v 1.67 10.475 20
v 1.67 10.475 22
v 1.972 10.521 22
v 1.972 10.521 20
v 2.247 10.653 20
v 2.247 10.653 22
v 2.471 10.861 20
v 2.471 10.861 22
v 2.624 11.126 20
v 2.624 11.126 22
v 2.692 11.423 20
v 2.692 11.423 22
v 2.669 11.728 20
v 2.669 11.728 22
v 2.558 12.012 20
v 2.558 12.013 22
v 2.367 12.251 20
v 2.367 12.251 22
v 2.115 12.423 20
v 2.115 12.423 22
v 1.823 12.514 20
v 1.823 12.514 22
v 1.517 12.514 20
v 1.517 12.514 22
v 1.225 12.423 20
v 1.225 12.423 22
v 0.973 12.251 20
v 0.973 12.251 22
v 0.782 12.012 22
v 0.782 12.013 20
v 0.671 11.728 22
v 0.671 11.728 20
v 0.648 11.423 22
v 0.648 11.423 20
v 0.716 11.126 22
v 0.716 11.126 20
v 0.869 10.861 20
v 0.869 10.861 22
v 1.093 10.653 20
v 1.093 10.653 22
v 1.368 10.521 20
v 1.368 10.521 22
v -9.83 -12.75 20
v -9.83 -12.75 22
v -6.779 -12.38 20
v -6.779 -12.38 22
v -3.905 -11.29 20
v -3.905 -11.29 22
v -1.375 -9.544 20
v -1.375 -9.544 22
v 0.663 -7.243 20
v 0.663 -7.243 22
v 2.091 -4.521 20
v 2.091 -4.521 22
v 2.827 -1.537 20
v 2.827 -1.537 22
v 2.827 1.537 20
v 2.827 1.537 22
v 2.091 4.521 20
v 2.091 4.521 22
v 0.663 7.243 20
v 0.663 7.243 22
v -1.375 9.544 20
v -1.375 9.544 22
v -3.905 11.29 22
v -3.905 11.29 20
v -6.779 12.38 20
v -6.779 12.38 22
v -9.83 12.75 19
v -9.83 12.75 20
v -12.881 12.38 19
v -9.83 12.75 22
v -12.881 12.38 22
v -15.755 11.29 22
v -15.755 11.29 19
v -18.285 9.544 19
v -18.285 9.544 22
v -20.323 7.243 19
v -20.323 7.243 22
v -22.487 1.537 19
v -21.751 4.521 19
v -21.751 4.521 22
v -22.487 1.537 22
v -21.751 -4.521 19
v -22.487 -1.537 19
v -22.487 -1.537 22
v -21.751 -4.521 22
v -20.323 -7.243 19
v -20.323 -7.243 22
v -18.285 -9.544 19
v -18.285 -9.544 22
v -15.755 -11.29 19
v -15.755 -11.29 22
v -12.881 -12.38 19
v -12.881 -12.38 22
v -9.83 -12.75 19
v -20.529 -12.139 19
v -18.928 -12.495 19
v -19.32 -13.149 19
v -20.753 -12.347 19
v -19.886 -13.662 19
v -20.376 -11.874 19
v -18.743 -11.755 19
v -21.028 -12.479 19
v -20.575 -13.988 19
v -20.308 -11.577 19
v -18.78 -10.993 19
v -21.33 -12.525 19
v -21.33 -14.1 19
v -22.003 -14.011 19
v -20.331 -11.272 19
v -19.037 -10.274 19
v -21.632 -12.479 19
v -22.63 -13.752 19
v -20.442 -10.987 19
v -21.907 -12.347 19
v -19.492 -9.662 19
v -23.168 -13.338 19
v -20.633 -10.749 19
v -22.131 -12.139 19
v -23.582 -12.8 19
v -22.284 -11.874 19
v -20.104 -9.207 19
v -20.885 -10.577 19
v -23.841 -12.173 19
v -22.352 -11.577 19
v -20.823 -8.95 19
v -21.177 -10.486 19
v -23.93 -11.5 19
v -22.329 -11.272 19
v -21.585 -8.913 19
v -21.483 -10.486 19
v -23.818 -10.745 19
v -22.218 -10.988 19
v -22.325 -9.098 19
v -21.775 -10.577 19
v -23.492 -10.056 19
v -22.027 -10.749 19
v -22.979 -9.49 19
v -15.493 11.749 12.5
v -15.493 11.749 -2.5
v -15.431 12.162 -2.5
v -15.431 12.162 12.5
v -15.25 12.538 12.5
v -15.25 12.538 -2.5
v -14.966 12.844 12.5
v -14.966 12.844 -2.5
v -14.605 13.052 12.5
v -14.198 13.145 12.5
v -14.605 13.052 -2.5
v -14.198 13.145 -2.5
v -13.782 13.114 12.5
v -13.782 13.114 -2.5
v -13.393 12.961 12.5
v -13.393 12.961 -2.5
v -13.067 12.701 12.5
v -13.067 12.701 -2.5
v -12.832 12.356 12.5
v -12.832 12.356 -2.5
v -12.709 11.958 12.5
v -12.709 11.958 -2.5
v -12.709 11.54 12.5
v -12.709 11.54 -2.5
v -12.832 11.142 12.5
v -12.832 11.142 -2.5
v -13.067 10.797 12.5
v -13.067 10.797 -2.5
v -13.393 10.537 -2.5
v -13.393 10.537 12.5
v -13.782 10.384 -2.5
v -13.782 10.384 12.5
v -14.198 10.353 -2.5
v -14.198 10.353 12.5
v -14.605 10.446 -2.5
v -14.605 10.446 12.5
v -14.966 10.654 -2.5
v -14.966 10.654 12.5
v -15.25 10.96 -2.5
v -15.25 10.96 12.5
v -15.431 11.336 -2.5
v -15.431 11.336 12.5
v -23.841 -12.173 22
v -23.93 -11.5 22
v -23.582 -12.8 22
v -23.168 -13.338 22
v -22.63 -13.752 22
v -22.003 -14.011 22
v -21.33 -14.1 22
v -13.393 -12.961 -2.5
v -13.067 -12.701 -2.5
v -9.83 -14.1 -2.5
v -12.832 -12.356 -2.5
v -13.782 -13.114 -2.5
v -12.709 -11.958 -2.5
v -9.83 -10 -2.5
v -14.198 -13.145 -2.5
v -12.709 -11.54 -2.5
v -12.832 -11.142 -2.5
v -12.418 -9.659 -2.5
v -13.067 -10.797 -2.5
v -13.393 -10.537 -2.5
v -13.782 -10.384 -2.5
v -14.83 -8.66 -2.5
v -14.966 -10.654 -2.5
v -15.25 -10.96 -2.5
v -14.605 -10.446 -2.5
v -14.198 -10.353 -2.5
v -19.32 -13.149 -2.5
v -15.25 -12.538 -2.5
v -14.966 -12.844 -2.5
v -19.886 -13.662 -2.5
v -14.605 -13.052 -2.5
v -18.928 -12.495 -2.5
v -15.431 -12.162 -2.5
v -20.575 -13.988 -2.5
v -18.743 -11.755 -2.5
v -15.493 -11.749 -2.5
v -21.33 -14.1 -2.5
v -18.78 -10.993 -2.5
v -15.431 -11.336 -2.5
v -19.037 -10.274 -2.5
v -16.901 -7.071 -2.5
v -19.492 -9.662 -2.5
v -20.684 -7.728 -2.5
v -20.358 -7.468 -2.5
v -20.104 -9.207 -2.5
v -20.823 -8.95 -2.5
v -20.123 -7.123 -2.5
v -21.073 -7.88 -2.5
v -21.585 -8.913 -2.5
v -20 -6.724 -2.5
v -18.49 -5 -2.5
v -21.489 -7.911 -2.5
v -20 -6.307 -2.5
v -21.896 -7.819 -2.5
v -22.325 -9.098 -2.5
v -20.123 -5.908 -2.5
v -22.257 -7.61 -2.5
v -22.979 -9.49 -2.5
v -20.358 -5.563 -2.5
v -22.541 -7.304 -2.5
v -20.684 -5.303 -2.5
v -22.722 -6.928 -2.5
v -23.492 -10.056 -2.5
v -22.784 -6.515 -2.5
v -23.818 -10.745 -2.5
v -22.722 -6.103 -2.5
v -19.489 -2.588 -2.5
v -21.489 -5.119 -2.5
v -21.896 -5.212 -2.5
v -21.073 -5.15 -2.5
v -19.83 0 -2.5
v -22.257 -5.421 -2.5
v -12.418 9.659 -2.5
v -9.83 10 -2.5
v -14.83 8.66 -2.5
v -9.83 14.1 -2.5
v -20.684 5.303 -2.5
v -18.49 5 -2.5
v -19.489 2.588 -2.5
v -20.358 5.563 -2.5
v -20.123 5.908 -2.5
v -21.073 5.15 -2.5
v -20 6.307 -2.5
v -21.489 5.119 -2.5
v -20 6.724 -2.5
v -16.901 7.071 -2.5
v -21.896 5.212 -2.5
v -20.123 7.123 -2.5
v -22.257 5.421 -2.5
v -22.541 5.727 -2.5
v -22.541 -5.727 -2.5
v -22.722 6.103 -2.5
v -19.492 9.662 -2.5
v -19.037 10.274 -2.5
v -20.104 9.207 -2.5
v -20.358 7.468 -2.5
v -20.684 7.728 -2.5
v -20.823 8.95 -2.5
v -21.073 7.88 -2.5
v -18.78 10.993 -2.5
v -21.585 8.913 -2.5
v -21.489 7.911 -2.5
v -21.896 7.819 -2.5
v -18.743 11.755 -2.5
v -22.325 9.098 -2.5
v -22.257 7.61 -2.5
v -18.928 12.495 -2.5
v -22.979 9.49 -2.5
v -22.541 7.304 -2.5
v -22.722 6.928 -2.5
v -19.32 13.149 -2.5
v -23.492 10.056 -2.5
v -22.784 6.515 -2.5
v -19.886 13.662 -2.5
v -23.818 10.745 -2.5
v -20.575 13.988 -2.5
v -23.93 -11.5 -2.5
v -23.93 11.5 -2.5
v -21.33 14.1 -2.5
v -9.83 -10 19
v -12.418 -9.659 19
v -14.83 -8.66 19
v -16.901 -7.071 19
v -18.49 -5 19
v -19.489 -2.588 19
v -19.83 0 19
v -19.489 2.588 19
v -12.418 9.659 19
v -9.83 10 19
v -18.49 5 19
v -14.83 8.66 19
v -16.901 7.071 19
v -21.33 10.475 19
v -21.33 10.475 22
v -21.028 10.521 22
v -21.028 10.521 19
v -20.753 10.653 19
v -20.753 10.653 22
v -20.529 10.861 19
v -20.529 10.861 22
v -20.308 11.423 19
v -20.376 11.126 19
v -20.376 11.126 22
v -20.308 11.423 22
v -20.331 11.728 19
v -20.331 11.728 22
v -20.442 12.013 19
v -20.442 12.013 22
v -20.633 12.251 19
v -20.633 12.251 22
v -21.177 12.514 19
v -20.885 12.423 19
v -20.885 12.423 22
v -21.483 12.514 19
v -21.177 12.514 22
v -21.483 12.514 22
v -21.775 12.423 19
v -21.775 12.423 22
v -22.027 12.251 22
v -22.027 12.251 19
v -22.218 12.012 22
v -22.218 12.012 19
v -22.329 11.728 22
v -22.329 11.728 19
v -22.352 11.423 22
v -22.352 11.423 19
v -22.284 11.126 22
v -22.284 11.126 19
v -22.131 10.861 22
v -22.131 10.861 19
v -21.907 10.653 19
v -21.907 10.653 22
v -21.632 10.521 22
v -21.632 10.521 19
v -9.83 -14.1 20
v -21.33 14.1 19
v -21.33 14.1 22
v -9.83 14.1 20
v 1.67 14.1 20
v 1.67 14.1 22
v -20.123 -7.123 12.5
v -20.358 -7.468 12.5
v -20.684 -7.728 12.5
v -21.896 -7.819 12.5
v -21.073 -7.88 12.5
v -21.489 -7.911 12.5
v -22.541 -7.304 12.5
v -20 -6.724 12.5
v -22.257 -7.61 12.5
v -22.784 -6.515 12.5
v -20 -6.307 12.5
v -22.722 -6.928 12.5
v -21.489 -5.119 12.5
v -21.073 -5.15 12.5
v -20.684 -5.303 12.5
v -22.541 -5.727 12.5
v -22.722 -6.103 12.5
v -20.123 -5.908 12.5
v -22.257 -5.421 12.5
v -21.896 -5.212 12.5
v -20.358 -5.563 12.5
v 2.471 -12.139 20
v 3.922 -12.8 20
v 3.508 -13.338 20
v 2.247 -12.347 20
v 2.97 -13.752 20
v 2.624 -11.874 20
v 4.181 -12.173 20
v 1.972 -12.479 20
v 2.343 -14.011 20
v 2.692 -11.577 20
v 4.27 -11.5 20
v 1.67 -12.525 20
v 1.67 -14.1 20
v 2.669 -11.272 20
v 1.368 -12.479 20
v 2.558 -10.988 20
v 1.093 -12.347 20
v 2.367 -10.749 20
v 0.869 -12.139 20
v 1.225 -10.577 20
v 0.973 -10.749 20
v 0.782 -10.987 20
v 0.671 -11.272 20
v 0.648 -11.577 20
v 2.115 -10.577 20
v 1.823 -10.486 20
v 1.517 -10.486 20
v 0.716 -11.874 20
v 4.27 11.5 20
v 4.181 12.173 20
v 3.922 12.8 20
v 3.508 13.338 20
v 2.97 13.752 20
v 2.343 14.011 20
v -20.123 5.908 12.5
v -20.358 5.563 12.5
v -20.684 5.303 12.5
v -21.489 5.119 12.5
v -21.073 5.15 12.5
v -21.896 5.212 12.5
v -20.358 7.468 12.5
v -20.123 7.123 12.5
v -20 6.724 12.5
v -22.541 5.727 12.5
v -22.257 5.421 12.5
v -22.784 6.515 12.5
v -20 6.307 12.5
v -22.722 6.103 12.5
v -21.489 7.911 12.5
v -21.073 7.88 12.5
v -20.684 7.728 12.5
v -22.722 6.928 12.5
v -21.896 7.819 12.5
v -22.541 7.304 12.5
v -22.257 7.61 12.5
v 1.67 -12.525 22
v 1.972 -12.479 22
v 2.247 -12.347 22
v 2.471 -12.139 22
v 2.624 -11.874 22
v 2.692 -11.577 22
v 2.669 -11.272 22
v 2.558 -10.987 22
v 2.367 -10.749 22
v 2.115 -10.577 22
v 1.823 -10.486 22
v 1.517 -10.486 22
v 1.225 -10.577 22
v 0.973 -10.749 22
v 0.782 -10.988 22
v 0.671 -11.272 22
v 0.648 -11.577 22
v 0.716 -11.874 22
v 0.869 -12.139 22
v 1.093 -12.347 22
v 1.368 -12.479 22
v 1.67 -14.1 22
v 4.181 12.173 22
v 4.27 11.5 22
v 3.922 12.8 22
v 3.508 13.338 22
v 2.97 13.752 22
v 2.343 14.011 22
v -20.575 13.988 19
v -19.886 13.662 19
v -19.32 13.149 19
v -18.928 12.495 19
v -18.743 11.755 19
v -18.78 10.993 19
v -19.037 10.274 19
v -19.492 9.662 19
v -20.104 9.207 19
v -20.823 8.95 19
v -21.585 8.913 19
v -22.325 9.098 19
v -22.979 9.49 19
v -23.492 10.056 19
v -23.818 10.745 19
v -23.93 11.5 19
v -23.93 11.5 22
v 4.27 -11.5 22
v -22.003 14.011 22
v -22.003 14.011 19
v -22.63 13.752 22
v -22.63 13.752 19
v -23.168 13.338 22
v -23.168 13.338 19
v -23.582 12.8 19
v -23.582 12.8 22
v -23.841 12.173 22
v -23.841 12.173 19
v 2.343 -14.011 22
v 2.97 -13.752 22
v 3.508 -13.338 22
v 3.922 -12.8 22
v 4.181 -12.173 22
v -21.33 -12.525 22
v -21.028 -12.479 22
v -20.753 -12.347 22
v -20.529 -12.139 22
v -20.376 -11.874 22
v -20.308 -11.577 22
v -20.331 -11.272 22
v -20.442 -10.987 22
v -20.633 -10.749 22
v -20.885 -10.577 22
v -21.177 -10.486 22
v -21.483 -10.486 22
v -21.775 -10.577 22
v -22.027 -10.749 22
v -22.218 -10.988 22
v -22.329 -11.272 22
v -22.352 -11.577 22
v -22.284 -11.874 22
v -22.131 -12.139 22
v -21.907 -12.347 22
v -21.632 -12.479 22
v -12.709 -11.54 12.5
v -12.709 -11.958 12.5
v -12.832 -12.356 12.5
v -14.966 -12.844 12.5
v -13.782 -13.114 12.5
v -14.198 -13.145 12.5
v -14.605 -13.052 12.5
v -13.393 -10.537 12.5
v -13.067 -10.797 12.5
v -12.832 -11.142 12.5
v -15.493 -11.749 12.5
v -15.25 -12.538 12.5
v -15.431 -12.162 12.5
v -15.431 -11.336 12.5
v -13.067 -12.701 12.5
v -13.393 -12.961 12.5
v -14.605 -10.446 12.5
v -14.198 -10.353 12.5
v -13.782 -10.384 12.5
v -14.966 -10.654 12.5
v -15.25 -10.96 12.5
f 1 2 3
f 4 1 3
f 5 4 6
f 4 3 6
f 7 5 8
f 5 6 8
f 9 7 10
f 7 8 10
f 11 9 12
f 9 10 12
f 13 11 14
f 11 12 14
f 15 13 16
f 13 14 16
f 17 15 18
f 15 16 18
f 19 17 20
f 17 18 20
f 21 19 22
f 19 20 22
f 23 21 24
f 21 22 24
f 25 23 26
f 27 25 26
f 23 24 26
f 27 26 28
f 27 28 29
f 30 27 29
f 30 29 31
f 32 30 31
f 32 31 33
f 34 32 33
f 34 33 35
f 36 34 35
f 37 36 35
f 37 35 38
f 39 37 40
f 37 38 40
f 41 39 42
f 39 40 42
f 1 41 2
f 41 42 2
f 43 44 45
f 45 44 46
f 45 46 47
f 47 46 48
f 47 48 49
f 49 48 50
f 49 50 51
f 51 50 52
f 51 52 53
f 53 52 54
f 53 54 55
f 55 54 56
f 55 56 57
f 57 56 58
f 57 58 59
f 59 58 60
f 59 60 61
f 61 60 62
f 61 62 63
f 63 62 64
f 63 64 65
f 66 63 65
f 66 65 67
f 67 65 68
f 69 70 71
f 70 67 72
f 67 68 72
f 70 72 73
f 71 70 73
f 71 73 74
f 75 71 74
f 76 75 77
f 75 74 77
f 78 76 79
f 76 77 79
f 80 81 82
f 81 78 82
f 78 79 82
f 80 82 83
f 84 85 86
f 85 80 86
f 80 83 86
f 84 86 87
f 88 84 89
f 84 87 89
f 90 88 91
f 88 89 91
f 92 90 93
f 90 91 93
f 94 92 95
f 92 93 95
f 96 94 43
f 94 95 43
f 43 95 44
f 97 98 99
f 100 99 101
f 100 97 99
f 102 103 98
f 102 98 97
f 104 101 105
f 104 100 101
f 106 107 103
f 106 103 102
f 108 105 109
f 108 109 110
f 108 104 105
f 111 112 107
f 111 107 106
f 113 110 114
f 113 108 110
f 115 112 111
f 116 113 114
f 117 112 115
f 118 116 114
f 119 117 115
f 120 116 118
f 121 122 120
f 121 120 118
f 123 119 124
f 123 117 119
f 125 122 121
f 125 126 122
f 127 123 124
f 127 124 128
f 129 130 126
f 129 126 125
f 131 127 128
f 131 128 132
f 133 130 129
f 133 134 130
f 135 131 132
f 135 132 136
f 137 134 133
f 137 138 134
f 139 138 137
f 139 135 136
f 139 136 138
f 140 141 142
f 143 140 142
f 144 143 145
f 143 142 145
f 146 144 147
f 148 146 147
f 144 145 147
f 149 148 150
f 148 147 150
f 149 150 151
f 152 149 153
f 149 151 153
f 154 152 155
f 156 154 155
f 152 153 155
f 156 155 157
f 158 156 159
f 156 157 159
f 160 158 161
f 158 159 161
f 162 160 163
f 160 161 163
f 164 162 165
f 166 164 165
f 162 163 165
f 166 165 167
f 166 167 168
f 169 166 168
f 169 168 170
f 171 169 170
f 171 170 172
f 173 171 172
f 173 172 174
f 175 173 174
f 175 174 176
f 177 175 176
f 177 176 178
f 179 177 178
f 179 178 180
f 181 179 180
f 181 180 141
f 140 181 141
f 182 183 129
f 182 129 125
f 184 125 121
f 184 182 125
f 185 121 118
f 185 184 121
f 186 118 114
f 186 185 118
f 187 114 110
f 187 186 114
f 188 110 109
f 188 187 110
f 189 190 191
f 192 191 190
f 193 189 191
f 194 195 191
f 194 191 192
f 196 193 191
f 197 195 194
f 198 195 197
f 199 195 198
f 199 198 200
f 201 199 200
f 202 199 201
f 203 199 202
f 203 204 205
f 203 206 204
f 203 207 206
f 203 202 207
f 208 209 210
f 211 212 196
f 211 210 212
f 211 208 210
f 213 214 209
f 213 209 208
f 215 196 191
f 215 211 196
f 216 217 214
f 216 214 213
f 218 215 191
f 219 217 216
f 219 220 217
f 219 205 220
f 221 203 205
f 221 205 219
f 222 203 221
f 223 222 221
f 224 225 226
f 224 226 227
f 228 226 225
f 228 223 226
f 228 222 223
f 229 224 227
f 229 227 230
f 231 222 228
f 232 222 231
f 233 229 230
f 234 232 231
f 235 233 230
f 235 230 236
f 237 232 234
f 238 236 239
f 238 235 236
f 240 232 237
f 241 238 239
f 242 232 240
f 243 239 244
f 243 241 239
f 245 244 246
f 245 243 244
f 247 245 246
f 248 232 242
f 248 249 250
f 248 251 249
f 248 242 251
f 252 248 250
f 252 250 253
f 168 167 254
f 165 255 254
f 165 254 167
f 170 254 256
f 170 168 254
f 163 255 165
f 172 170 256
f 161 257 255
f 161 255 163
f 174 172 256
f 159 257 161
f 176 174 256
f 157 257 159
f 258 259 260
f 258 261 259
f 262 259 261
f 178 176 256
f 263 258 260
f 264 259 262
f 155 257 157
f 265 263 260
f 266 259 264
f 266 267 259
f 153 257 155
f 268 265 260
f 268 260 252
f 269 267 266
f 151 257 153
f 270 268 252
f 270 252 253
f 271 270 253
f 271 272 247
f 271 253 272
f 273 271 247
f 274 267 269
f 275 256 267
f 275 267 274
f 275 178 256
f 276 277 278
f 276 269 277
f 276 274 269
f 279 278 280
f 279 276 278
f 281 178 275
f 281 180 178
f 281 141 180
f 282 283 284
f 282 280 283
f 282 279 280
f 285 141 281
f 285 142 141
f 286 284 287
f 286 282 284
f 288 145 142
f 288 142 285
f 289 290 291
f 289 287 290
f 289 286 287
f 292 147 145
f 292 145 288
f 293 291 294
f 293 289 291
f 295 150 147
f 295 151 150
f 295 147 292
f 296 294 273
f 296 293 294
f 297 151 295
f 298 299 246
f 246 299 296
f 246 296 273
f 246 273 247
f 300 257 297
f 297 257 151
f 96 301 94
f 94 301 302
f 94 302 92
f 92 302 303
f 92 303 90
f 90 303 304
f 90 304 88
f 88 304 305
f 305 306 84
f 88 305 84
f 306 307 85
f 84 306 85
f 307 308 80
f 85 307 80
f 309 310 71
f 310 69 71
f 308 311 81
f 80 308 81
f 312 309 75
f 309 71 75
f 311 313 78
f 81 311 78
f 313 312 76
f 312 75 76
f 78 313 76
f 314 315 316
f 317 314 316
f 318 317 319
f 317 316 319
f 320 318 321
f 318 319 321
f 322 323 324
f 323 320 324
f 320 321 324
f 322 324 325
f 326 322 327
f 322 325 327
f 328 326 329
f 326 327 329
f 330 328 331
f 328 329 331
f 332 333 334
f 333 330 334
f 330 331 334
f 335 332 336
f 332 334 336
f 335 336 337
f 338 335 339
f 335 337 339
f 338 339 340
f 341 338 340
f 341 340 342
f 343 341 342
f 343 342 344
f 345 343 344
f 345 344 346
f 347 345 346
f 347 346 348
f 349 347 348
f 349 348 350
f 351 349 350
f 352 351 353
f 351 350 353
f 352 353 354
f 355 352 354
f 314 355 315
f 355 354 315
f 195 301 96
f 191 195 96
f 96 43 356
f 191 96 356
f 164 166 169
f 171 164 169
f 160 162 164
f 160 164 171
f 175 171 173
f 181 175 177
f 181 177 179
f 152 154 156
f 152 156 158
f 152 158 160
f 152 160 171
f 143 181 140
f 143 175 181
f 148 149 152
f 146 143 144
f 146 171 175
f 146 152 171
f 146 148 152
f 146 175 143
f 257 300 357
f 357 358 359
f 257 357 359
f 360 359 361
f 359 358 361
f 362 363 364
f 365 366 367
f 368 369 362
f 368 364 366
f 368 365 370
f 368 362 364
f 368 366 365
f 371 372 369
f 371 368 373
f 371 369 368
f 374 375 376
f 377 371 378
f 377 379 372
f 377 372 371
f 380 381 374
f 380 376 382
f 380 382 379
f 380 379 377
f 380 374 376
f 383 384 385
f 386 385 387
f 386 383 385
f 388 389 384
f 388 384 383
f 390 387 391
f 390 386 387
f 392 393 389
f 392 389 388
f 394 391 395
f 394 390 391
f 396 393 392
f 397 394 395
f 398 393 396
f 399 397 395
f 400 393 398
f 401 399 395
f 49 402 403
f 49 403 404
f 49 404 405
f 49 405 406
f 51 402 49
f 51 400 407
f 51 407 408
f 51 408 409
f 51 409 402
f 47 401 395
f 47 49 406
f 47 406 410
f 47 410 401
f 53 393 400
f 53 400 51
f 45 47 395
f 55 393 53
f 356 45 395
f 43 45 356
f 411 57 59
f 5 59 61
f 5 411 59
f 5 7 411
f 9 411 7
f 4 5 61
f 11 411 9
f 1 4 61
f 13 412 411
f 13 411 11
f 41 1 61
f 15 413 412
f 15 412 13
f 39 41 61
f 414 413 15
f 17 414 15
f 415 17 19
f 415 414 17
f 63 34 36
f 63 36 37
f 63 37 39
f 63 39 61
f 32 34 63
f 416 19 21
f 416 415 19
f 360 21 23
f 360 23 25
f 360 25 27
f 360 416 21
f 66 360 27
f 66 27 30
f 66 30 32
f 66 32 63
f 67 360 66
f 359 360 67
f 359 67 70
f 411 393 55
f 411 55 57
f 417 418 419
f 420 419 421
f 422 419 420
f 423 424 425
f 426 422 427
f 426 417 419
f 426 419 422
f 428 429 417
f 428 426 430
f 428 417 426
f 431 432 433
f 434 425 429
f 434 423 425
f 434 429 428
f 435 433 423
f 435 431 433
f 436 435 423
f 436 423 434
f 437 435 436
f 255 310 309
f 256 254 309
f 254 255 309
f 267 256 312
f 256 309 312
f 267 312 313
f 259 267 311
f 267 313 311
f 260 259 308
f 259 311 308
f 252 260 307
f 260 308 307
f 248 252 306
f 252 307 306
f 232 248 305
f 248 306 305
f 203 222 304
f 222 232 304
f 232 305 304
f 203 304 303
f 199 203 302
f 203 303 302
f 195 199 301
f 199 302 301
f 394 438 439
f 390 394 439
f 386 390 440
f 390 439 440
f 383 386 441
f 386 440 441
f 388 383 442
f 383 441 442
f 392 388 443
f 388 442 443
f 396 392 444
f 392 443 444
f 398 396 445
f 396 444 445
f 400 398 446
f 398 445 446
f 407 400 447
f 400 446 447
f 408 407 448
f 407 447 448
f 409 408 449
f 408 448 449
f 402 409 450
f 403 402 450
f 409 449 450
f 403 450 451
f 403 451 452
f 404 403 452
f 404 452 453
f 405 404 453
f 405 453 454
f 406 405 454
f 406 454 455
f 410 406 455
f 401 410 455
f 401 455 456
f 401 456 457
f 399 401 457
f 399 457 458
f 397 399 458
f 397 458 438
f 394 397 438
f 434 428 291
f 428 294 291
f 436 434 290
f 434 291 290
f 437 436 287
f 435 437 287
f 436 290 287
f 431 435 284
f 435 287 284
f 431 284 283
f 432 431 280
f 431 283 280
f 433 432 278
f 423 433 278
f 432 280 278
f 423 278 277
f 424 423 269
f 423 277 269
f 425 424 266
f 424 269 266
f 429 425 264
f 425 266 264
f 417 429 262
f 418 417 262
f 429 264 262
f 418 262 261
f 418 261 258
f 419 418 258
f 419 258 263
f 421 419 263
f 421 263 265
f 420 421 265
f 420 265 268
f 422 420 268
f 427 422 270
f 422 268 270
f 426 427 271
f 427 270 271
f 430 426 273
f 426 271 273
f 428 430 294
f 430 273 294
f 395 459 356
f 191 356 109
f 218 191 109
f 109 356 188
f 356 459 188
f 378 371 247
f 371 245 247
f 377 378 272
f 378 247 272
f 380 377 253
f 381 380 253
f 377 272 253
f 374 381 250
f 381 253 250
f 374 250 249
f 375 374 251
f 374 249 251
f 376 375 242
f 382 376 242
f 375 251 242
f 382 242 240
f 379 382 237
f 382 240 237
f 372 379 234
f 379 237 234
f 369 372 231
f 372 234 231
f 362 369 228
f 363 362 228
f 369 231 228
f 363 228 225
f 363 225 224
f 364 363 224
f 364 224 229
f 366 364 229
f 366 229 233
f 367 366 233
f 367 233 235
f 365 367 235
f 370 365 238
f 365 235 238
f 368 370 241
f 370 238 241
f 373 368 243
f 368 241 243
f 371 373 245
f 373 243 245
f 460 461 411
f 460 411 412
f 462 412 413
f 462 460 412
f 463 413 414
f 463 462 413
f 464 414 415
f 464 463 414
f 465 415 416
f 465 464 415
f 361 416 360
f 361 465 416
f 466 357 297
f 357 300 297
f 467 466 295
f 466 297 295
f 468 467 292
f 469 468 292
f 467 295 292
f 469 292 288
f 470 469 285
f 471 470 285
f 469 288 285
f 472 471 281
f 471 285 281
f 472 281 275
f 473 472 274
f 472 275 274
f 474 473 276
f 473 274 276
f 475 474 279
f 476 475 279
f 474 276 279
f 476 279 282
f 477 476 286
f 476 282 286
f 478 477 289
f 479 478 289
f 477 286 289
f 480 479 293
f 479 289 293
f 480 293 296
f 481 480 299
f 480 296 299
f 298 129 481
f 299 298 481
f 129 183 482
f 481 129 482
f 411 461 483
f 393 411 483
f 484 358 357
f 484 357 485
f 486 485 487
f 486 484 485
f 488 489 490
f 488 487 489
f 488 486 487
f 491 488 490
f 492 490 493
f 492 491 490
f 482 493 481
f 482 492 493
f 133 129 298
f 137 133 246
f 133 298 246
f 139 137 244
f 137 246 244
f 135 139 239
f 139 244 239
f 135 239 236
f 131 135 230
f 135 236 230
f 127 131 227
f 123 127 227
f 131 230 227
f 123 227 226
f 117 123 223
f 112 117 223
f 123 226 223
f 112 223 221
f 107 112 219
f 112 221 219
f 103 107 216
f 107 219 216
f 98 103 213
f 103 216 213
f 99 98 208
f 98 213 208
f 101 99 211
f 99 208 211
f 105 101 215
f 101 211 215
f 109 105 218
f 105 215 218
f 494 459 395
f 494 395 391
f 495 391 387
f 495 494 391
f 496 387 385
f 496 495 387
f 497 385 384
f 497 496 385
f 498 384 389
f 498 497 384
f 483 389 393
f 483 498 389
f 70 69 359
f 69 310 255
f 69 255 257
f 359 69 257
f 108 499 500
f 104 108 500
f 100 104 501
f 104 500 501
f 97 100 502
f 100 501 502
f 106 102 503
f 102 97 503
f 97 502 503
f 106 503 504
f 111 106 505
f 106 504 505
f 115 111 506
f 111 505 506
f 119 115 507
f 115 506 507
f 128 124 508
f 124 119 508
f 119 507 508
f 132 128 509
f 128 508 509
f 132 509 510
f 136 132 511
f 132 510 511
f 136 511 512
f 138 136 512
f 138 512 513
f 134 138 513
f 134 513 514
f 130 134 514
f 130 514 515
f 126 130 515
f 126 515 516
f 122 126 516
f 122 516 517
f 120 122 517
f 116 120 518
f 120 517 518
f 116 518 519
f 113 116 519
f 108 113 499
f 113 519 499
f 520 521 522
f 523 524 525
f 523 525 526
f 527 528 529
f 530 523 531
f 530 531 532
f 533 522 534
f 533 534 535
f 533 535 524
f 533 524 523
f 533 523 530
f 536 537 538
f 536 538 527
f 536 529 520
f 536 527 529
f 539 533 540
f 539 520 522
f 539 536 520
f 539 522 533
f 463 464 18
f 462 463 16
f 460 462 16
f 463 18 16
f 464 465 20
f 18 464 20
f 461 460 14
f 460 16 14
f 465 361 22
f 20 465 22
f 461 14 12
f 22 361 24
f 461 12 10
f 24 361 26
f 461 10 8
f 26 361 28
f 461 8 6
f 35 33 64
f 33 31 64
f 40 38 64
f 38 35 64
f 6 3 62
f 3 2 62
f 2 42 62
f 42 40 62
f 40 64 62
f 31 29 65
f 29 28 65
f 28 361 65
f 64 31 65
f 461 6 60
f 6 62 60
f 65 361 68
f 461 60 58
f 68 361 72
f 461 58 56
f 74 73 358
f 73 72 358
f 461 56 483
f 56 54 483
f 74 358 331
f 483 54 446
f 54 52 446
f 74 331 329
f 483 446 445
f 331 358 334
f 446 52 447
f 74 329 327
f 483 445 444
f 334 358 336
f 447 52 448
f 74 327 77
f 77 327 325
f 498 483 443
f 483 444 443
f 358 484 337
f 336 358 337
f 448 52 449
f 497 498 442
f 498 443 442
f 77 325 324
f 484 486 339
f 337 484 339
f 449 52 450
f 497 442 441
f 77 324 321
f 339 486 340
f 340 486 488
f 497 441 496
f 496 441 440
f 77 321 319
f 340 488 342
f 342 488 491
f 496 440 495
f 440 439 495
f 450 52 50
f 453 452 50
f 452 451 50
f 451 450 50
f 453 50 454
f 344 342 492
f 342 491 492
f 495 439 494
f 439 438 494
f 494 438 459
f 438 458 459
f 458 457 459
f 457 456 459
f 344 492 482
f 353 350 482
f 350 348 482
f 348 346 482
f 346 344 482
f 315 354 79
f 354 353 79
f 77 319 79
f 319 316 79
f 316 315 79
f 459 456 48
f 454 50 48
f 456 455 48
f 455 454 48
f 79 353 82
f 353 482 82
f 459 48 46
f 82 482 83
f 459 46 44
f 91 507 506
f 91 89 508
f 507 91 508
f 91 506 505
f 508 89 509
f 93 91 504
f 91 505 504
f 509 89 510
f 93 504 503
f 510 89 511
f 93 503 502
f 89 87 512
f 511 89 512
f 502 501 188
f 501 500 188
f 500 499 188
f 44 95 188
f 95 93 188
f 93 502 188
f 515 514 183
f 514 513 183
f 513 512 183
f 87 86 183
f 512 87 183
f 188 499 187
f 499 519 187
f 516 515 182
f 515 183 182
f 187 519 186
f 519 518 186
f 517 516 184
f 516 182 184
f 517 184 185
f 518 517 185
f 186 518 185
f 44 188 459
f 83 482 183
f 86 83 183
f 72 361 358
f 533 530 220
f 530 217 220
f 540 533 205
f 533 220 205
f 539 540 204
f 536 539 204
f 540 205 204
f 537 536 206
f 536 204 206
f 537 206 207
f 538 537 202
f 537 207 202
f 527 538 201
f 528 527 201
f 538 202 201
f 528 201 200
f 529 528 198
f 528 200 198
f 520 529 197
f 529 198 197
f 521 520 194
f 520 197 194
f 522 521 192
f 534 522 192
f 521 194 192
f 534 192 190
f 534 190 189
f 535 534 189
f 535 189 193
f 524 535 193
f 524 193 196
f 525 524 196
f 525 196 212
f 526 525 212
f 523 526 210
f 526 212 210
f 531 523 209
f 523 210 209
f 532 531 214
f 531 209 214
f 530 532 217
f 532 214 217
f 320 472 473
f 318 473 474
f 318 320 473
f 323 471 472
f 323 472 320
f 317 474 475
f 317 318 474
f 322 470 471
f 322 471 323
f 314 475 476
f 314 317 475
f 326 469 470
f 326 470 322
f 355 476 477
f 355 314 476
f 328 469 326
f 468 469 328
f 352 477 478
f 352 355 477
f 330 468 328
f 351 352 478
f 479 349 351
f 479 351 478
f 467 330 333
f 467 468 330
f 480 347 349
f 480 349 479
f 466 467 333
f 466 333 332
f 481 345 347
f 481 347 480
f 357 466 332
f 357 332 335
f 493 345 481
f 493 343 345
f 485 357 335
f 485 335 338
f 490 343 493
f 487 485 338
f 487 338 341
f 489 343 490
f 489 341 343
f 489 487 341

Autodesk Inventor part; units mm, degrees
ref_plane "YZ Plane" through (0, 0, 0) normal (1, 0, 0) x (0, 1, 0)
ref_plane "XZ Plane" through (0, 0, 0) normal (0, 1, 0) x (-1, 0, 0)
ref_plane "Work Plane3" through (-9.83, 0, 22) normal (0, 0, -1) x (0, -1, 0)
sketch "Sketch2" plane through (-9.83, 0, 22) normal (0, 0, -1) x (0, -1, 0)
  line L0 (14, 11.5) -> (14, -11.5) construction
  arc A0 (14, 11.5) -> (11.5, 14) centre (11.5, 11.5) ccw construction
  line L1 (-11.5, 14) -> (11.5, 14) construction
  arc A1 (-11.5, 14) -> (-14, 11.5) centre (-11.5, 11.5) ccw construction
  line L2 (-14, -11.5) -> (-14, 11.5) construction
  arc A2 (-14, -11.5) -> (-11.5, -14) centre (-11.5, -11.5) ccw construction
  line L3 (11.5, -14) -> (-11.5, -14) construction
  arc A3 (11.5, -14) -> (14, -11.5) centre (11.5, -11.5) ccw construction
  circle A4 centre (0, 0) radius 11 construction
  circle A5 centre (-11.5, 11.5) radius 1.025 construction
  circle A6 centre (11.5, 11.5) radius 1.025 construction
  circle A7 centre (11.5, -11.5) radius 1.025 construction
  circle A8 centre (-11.5, -11.5) radius 1.025 construction
  line L4 (14.1, -11.5) -> (14.1, 11.5)
  arc A9 (14.1, 11.5) -> (11.5, 14.1) centre (11.5, 11.5) ccw
  line L5 (11.5, 14.1) -> (-11.5, 14.1)
  arc A10 (-11.5, 14.1) -> (-14.1, 11.5) centre (-11.5, 11.5) ccw
  line L6 (-14.1, 11.5) -> (-14.1, -11.5)
  arc A11 (-14.1, -11.5) -> (-11.5, -14.1) centre (-11.5, -11.5) ccw
  line L7 (-11.5, -14.1) -> (11.5, -14.1)
  arc A12 (11.5, -14.1) -> (14.1, -11.5) centre (11.5, -11.5) ccw
  circle A13 centre (0, 0) radius 12.75
  circle A14 centre (-11.5, -11.5) radius 1.025
  circle A15 centre (11.5, -11.5) radius 1.025
  circle A16 centre (11.5, 11.5) radius 1.025
  circle A17 centre (-11.5, 11.5) radius 1.025
  point P0 (0, -9.83)
  dimension "d3" = 0.1
  dimension "d4" = 25.5
  dimension "d5" = 0
  dimension "d6" = 0
  dimension "d7" = 0
  dimension "d8" = 0
extrude "Extrusion2" add sketch "Sketch2" along normal blind 3
sketch "Sketch3" plane through (-9.83, 0, 19) normal (0, 0, -1) x (-1, 0, 0)
  circle A0 centre (0, 0) radius 12.75 projected
  circle A1 centre (11.5, 11.5) radius 1.025 projected
  circle A2 centre (11.5, -11.5) radius 1.025 projected
  circle A3 centre (-11.5, -11.5) radius 1.025 projected
  circle A4 centre (-11.5, 11.5) radius 1.025 projected
  line L0 (-11.5, -14.1) -> (11.5, -14.1) projected
  arc A5 (11.5, -14.1) -> (14.1, -11.5) centre (11.5, -11.5) ccw projected
  line L1 (14.1, -11.5) -> (14.1, 11.5) projected
  arc A6 (14.1, 11.5) -> (11.5, 14.1) centre (11.5, 11.5) ccw projected
  line L2 (11.5, 14.1) -> (-11.5, 14.1) projected
  arc A7 (-11.5, 14.1) -> (-14.1, 11.5) centre (-11.5, 11.5) ccw projected
  line L3 (-14.1, 11.5) -> (-14.1, -11.5) projected
  arc A8 (-14.1, -11.5) -> (-11.5, -14.1) centre (-11.5, -11.5) ccw projected
  line L4 (-11.5, -14.1) -> (11.5, -14.1) projected
  line L5 (0, -14.1) -> (0, -12.75)
  line L6 (0, 12.75) -> (0, 14.1)
  line L7 (11.5, 14.1) -> (-11.5, 14.1) projected
  circle A9 centre (0, 0) radius 10
  line L8 (0, -10) -> (0, -12.75)
  line L9 (0, 10) -> (0, 12.75)
  point P0 (-9.83, 0)
  dimension "d11" = 20
ref_plane "Work Plane4" through (-37.83, -24.85, 0) normal (0, 0, -1) x (0, 1, 0)
extrude "Extrusion3" add sketch "Sketch3" along normal blind 21.5 contours A0 L8 A9 L9 | A0 L6 L2 A6 L1 A5 L0 L5 picked at (11.7268, -0.9457)
sketch "Sketch4" plane through (-9.83, -14.1, -2.5) normal (0, 0, -1) x (-1, 0, 0)
  circle A0 centre (4.2632, 2.351) radius 1.4
  circle A1 centre (11.5541, 7.5847) radius 1.4
  arc A2 (0, 4.1) -> (0, 24.1) centre (0, 14.1) ccw projected
  line L0 (10, 14.1) -> (14.0989, 14.1)
  circle A3 centre (4.2632, 25.849) radius 1.4
  circle A4 centre (11.5541, 20.6153) radius 1.4
  point P0 (-9.83, 14.1)
  dimension "d16" = 2.8
  dimension "d17" = 2.8
extrude "Extrusion4" cut sketch "Sketch4" against normal blind 15
sketch "Sketch5" plane through (-9.83, -14.1, -2.5) normal (0, 0, -1) x (-1, 0, 0)
  circle A0 centre (11.5, 2.6) radius 1.025 projected
  circle A1 centre (11.5, 25.6) radius 1.025 projected
  circle A2 centre (11.5, 2.6) radius 2.6
  circle A3 centre (11.5, 25.6) radius 2.6
  point P0 (-9.83, 14.1)
  point P1 (14.1, 2.6)
  dimension "d11" = 20
extrude "Extrusion5" cut sketch "Sketch5" against normal up to surface (21.5 mm away) contours A0 | A1 | A2 | A3
sketch "Sketch6" plane through (-9.83, 0, 19) normal (0, 0, -1) x (-1, 0, 0)
  circle A0 centre (-11.5, 11.5) radius 1.025 projected
  circle A1 centre (-11.5, -11.5) radius 1.025 projected
  line L0 (0, -14.1) -> (0, -12.75) projected
  arc A2 (0, 12.75) -> (0, -12.75) centre (0, 0) ccw projected
  line L1 (0, 12.75) -> (0, 14.1) projected
  line L2 (0, 14.1) -> (-11.5, 14.1) projected
  arc A3 (-11.5, 14.1) -> (-14.1, 11.5) centre (-11.5, 11.5) ccw projected
  line L3 (-14.1, 11.5) -> (-14.1, -11.5) projected
  arc A4 (-14.1, -11.5) -> (-11.5, -14.1) centre (-11.5, -11.5) ccw projected
  line L4 (-11.5, -14.1) -> (0, -14.1) projected
  point P0 (-9.83, 0)
extrude "Extrusion6" cut sketch "Sketch6" against normal blind 1
properties part number "30_Cube_Z_Focus_MGN_NEMA_Motoradapter_NEMA11_v3"
